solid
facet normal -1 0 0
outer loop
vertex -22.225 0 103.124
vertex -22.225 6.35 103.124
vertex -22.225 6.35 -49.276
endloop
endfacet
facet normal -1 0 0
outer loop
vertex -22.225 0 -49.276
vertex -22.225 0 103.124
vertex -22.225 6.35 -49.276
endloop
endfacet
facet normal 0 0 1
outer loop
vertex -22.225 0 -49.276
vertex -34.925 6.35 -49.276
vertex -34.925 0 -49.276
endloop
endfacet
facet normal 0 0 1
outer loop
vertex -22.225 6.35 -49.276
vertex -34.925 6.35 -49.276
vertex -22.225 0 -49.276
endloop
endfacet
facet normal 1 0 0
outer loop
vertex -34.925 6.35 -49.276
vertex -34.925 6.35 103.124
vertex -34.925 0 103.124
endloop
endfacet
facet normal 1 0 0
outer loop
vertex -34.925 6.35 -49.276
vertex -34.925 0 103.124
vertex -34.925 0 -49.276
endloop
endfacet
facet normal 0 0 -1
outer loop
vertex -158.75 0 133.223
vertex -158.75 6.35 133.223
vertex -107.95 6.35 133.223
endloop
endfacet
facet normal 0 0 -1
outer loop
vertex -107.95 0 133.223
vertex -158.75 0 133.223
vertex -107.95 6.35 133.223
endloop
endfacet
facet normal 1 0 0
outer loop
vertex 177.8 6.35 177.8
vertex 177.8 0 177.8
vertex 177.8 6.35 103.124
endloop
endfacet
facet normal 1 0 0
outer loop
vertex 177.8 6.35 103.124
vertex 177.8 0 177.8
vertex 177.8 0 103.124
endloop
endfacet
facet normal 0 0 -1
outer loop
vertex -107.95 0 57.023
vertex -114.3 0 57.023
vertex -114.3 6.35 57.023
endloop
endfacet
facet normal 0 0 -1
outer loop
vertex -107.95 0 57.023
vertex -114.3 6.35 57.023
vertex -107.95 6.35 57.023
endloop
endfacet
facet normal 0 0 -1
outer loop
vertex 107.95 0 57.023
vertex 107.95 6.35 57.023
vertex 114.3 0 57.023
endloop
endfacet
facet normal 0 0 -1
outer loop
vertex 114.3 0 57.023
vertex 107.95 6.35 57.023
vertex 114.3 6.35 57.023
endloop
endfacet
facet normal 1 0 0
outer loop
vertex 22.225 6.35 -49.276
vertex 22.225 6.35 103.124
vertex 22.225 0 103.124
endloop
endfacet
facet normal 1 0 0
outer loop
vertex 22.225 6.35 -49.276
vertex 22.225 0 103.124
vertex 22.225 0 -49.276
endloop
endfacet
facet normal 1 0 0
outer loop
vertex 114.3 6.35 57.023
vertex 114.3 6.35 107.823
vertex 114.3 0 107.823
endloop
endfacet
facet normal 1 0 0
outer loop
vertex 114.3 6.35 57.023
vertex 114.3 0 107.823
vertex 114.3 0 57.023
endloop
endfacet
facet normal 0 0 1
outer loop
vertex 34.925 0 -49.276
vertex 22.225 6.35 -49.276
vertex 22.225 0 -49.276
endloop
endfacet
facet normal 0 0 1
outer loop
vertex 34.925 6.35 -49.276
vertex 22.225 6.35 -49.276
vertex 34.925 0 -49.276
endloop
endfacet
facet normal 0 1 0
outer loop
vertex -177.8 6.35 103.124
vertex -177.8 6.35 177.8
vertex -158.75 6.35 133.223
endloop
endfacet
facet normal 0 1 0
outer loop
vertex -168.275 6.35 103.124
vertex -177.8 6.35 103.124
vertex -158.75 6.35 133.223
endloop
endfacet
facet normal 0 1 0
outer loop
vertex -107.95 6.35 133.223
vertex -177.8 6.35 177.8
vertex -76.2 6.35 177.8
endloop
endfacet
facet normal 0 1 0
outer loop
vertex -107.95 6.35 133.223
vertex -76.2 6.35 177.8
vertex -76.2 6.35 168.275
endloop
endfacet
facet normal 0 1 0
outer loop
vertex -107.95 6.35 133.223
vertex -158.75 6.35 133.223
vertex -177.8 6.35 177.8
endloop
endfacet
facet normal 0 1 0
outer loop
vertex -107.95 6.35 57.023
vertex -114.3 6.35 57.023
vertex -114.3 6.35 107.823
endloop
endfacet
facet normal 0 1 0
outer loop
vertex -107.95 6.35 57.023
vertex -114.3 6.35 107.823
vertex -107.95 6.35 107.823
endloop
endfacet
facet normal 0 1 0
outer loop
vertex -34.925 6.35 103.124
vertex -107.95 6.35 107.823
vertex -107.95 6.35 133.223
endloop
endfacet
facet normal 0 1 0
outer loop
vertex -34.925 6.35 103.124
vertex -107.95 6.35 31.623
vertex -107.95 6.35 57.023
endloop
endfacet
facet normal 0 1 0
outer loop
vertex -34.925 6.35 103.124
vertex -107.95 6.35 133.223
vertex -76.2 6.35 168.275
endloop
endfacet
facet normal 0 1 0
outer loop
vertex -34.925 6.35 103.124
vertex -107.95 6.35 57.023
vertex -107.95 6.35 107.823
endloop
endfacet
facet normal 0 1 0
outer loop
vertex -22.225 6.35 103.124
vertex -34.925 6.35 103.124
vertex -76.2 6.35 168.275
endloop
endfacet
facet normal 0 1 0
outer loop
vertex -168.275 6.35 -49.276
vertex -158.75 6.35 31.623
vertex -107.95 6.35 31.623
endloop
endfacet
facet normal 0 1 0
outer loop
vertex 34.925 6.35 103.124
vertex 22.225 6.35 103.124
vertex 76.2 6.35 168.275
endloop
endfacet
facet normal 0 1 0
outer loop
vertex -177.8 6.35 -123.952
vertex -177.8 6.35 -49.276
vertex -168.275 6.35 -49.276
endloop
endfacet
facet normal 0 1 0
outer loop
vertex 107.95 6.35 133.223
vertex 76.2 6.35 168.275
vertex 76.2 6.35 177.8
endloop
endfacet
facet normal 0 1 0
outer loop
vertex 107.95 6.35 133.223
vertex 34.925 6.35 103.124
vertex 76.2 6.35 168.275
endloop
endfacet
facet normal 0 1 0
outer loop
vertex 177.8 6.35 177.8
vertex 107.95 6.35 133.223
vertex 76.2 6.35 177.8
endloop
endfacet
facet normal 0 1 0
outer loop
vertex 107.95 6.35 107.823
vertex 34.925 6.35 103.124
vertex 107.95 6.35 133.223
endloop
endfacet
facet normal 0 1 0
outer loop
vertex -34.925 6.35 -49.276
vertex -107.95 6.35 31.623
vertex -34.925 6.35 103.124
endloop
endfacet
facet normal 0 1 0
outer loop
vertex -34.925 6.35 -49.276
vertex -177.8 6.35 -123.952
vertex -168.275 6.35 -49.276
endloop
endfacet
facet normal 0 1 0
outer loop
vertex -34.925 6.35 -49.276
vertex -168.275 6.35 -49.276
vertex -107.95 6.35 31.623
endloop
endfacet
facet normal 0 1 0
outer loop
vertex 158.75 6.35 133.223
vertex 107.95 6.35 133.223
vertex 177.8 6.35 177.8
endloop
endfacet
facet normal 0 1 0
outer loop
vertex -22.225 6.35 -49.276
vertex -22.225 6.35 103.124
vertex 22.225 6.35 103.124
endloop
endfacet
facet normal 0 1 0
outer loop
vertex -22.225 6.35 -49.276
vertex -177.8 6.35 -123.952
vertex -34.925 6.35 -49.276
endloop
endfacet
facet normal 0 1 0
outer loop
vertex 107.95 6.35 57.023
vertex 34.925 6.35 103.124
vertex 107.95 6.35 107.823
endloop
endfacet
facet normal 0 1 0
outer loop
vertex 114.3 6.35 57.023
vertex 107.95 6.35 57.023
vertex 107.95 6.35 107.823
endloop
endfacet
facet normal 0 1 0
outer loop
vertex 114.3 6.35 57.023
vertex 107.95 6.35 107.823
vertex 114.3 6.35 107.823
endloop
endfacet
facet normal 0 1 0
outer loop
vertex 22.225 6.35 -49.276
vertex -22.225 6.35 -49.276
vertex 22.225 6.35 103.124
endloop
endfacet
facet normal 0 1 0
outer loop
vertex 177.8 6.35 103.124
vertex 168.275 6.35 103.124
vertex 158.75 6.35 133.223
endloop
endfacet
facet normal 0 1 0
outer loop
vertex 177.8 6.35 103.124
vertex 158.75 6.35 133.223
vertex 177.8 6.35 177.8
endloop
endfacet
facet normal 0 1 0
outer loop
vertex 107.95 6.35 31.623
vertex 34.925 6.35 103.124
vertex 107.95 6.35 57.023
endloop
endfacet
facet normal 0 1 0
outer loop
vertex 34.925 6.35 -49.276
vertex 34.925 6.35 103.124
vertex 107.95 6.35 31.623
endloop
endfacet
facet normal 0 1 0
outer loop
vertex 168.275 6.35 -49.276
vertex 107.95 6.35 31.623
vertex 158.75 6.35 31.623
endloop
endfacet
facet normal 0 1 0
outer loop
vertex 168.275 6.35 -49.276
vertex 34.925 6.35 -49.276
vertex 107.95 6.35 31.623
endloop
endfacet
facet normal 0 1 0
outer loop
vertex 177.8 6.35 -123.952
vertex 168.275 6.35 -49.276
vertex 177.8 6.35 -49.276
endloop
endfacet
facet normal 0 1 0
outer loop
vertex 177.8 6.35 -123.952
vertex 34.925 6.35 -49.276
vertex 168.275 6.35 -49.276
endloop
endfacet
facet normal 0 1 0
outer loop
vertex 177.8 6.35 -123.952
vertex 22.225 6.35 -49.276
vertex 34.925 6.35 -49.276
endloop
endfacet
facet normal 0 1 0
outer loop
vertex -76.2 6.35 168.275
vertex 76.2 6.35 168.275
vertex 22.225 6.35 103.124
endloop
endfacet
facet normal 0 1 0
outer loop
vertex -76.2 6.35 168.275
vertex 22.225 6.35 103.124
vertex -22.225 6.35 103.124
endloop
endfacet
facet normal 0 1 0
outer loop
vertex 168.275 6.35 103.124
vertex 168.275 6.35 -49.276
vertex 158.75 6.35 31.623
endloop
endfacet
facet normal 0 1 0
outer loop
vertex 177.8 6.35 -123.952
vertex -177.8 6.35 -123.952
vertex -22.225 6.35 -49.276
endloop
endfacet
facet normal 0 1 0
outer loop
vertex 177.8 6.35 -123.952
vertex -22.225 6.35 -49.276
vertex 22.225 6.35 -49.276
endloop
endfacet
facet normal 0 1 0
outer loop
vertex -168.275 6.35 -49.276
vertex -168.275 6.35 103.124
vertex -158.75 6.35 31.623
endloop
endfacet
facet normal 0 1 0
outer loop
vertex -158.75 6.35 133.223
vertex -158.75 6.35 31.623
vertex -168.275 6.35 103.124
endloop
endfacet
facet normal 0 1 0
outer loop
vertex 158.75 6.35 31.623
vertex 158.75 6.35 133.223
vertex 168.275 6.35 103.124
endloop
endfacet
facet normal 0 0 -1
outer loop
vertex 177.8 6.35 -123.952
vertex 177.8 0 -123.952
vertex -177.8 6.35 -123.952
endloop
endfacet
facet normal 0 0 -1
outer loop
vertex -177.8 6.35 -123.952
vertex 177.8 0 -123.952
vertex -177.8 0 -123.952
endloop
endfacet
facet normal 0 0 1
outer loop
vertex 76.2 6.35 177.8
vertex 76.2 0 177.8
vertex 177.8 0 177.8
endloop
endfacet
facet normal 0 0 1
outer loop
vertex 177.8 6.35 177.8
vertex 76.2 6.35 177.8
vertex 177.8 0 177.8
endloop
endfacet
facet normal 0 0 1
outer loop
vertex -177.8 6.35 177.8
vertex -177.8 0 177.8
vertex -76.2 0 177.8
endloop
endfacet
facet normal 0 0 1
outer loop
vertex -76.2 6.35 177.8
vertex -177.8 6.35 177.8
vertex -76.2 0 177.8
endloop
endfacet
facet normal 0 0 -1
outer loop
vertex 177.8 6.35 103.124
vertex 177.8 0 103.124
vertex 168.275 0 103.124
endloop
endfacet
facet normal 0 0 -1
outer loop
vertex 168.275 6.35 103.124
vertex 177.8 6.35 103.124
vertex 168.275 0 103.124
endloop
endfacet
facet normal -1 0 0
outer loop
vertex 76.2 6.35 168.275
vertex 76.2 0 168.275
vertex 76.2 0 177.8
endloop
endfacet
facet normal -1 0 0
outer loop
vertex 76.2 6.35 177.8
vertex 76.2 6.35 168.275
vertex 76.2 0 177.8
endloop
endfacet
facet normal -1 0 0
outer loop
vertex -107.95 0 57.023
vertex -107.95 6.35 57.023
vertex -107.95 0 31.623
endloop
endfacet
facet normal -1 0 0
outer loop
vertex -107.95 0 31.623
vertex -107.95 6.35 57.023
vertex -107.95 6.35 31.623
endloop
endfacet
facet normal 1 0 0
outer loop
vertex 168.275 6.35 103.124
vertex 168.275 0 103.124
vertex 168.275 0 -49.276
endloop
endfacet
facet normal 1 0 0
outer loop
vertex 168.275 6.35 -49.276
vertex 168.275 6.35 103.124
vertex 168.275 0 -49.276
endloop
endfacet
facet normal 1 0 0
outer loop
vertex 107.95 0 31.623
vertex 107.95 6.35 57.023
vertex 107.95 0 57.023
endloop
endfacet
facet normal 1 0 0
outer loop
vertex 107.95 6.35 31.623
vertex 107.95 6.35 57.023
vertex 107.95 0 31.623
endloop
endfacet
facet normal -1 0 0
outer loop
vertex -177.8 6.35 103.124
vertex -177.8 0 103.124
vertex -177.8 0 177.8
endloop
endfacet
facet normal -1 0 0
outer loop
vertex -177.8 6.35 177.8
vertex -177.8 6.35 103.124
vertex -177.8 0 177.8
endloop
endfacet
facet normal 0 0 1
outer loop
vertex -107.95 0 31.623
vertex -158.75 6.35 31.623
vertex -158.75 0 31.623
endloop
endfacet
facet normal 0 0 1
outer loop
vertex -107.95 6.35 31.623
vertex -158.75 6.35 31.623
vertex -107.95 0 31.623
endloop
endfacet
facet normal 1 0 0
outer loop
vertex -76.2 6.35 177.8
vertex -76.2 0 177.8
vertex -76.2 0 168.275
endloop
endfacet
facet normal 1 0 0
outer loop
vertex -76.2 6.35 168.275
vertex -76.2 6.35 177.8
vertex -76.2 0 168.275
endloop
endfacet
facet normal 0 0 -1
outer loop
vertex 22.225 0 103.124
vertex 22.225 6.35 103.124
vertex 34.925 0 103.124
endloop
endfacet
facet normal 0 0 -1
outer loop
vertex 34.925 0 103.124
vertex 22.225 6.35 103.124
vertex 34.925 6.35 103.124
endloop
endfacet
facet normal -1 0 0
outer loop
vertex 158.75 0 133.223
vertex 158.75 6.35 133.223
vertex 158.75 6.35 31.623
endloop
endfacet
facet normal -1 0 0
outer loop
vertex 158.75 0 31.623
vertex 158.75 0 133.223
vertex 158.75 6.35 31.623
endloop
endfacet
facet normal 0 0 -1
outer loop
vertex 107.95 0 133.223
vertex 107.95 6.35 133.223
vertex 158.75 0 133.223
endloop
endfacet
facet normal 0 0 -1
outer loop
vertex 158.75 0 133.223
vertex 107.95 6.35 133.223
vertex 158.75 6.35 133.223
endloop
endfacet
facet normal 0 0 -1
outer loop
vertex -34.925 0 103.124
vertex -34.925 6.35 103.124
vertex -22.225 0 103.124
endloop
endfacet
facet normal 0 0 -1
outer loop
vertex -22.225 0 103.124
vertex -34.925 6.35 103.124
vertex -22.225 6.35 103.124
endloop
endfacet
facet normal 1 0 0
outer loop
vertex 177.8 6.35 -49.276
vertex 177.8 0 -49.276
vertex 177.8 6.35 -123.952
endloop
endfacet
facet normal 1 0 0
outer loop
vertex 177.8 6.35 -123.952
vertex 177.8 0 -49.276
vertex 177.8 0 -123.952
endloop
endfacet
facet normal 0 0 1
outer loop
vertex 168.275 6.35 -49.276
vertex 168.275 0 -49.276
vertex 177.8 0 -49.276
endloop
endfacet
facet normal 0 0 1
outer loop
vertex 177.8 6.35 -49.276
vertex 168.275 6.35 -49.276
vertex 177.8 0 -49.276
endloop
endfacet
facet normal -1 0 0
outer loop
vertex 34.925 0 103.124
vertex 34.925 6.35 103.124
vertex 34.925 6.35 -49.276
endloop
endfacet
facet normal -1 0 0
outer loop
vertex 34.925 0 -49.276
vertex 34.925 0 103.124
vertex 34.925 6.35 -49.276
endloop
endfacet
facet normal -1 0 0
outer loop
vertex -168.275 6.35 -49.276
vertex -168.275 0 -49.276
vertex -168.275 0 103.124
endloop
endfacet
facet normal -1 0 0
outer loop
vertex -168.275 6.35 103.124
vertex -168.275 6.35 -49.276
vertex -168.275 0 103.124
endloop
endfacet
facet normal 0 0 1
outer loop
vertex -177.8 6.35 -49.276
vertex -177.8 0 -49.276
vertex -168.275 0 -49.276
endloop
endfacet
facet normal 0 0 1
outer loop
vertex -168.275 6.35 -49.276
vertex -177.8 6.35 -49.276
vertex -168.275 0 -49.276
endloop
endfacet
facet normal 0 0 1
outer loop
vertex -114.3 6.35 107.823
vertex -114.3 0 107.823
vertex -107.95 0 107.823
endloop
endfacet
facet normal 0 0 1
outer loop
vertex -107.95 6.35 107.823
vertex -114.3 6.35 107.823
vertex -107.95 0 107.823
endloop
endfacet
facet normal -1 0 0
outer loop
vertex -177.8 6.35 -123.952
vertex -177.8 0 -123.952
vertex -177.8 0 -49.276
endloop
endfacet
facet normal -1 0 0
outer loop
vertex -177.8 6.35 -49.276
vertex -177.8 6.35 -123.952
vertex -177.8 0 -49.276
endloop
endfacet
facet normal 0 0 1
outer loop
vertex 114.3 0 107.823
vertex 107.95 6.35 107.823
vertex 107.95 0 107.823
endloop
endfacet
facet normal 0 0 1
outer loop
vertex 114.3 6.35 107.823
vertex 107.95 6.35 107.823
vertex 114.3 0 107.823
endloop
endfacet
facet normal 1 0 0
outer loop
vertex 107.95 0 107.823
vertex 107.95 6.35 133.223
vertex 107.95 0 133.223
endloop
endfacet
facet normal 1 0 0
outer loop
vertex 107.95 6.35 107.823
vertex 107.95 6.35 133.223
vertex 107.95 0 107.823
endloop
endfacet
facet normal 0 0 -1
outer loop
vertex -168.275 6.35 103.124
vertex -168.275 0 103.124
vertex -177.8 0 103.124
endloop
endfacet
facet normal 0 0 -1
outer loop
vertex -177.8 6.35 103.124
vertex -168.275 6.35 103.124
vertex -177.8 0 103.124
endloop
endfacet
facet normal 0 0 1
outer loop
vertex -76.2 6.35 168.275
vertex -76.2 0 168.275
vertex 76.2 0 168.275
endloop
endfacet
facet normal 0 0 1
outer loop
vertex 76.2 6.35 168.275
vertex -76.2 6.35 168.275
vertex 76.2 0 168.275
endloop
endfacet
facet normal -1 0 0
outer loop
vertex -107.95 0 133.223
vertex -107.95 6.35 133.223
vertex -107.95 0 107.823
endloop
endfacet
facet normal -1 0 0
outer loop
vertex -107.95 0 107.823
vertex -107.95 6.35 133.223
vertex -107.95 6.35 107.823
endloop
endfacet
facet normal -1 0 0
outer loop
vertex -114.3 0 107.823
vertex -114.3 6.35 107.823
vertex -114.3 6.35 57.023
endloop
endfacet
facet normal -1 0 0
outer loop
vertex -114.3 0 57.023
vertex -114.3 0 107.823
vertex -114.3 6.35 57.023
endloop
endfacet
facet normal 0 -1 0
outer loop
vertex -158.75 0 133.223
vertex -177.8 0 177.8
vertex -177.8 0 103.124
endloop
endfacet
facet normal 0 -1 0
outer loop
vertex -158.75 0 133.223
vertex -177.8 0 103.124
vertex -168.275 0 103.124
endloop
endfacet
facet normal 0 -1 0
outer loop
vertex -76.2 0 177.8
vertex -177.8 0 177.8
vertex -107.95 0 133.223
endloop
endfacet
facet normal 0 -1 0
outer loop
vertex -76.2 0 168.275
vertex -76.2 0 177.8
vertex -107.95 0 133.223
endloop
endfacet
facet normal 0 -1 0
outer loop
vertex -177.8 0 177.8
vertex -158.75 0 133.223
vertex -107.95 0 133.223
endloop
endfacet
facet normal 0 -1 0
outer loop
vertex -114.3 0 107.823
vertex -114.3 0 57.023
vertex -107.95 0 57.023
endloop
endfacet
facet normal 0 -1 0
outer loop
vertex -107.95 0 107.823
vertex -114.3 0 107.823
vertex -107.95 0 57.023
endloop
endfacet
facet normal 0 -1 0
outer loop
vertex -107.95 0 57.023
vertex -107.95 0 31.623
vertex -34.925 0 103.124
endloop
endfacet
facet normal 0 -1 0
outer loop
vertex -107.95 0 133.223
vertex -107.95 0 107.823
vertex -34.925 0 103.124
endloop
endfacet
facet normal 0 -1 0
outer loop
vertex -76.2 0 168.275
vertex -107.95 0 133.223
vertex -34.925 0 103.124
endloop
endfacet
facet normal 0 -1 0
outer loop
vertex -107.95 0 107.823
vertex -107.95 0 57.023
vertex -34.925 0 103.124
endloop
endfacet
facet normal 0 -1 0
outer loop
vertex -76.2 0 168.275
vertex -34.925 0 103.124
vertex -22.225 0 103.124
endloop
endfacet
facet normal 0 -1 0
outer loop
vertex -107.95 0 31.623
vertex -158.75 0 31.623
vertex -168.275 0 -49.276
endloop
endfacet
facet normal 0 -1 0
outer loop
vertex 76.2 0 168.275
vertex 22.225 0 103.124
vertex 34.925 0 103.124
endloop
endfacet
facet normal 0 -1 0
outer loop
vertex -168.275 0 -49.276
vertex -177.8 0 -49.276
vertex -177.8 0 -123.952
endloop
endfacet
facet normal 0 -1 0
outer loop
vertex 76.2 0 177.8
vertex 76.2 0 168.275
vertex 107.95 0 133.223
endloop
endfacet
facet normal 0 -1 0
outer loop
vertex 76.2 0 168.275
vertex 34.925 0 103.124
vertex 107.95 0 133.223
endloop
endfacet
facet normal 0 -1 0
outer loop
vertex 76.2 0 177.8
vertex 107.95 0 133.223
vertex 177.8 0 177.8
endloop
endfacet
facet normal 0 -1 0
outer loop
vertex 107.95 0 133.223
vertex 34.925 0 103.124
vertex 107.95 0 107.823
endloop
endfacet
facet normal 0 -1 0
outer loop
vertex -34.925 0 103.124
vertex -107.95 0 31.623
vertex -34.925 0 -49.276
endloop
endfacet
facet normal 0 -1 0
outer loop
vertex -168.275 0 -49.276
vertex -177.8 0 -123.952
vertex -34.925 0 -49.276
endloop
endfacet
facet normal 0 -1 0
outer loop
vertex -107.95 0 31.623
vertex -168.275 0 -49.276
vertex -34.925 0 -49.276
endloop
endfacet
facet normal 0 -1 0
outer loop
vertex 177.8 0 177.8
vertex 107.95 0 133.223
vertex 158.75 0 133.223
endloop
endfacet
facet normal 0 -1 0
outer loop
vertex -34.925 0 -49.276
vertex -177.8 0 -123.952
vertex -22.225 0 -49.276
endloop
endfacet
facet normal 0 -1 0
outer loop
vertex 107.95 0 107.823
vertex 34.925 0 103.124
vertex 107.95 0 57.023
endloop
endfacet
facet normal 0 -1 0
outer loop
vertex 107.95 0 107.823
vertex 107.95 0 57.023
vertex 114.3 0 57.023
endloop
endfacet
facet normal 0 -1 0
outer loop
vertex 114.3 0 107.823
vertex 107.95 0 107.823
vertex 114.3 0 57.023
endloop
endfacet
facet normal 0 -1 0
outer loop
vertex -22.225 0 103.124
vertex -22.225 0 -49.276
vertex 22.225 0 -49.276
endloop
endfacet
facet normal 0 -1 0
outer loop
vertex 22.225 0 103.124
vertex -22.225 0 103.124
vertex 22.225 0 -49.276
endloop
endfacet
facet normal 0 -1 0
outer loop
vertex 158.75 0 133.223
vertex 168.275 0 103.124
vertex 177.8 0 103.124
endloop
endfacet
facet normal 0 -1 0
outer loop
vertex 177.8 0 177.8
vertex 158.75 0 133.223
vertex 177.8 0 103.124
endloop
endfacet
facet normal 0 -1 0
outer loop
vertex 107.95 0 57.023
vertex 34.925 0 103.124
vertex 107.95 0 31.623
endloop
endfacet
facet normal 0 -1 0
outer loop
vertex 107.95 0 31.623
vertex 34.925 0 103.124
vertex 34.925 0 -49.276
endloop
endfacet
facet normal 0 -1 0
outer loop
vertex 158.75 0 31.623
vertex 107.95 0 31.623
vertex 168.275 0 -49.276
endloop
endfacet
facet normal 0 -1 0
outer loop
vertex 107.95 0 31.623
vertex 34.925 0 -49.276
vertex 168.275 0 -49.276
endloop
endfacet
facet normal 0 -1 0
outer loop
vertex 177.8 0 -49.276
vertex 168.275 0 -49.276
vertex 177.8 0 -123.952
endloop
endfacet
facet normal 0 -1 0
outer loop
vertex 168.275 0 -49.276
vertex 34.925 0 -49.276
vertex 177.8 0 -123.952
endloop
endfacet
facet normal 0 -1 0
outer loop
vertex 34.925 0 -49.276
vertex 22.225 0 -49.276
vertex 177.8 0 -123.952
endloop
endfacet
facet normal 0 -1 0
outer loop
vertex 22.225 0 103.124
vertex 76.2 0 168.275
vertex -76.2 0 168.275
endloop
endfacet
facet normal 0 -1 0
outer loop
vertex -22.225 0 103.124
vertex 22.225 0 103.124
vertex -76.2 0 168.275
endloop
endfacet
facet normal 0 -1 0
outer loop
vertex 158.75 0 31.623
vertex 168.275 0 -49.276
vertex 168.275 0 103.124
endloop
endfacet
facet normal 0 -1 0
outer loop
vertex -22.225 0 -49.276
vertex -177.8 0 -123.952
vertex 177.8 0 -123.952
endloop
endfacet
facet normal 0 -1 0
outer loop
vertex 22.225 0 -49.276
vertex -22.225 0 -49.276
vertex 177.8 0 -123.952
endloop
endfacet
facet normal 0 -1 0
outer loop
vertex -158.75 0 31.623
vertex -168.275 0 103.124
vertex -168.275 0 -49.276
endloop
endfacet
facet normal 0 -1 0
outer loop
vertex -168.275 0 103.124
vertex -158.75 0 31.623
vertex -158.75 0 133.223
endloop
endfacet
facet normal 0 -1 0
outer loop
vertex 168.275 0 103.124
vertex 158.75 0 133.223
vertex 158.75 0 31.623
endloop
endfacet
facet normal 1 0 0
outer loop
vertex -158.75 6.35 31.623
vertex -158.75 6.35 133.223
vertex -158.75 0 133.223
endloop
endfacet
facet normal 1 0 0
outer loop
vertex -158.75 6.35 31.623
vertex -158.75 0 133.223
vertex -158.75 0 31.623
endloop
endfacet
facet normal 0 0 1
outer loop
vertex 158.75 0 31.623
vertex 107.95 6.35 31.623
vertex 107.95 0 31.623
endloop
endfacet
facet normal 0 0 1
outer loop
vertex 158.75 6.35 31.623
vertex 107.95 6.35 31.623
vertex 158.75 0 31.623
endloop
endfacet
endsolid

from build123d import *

# Parameters (mm, degrees)
BOSS_EXTRUDE1_DEPTH = 6.35
SKETCH4_W           = 38.1
SKETCH4_H           = 101.6
CUT_EXTRUDE3_DEPTH  = 252.527339468
SKETCH5_W           = 12.7
SKETCH5_H           = 25.4
CUT_EXTRUDE4_DEPTH  = 252.527339468
SKETCH6_W           = 6.35
SKETCH6_H           = 50.8
CUT_EXTRUDE5_DEPTH  = 252.527339468
SKETCH13_W          = 12.7
SKETCH13_H          = 152.4
CUT_EXTRUDE8_DEPTH  = 252.527339468


with BuildPart() as part:
    # Sketch1 → Boss-Extrude1 (new body)
    with BuildSketch(Plane(origin=(0, 0, 0), x_dir=(1, 0, 0), z_dir=(0, 1, 0))):
        Polygon((-177.8, -177.8), (-76.2, -177.8), (-76.2, -168.275), (76.2, -168.275), (76.2, -177.8), (177.8, -177.8), (177.8, -103.124), (168.275, -103.124), (168.275, 49.276), (177.8, 49.276), (177.8, 123.952), (-177.8, 123.952), (-177.8, 49.276), (-168.275, 49.276), (-168.275, -103.124), (-177.8, -103.124), align=None)
    extrude(amount=BOSS_EXTRUDE1_DEPTH)

    # Sketch4 → Cut-Extrude3 (cut, through all)
    with BuildSketch(Plane(origin=(0, 6.35, 0), x_dir=(1, 0, 0), z_dir=(0, 1, 0))):
        with Locations((139.7, -82.423)):
            Rectangle(SKETCH4_W, SKETCH4_H)
        with Locations((-139.7, -82.423)):
            Rectangle(SKETCH4_W, SKETCH4_H)
    extrude(amount=-CUT_EXTRUDE3_DEPTH, mode=Mode.SUBTRACT)

    # Sketch5 → Cut-Extrude4 (cut, through all)
    with BuildSketch(Plane(origin=(0, 6.35, 0), x_dir=(1, 0, 0), z_dir=(0, 1, 0))):
        with Locations((114.3, -120.523)):
            Rectangle(SKETCH5_W, SKETCH5_H)
        with Locations((114.3, -44.323)):
            Rectangle(SKETCH5_W, SKETCH5_H)
        with Locations((-114.3, -44.323)):
            Rectangle(SKETCH5_W, SKETCH5_H)
        with Locations((-114.3, -120.523)):
            Rectangle(SKETCH5_W, SKETCH5_H)
    extrude(amount=-CUT_EXTRUDE4_DEPTH, mode=Mode.SUBTRACT)

    # Sketch6 → Cut-Extrude5 (cut, through all)
    with BuildSketch(Plane(origin=(0, 6.35, 0), x_dir=(1, 0, 0), z_dir=(0, 1, 0))):
        with Locations((117.475, -82.423)):
            Rectangle(SKETCH6_W, SKETCH6_H)
        with Locations((-117.475, -82.423)):
            Rectangle(SKETCH6_W, SKETCH6_H)
    extrude(amount=-CUT_EXTRUDE5_DEPTH, mode=Mode.SUBTRACT)

    # Sketch13 → Cut-Extrude8 (cut, through all)
    with BuildSketch(Plane(origin=(0, 6.35, 0), x_dir=(1, 0, 0), z_dir=(0, 1, 0))):
        with Locations((-28.575, -26.924)):
            Rectangle(SKETCH13_W, SKETCH13_H)
        with Locations((28.575, -26.924)):
            Rectangle(SKETCH13_W, SKETCH13_H)
    extrude(amount=-CUT_EXTRUDE8_DEPTH, mode=Mode.SUBTRACT)


solid = part.part
